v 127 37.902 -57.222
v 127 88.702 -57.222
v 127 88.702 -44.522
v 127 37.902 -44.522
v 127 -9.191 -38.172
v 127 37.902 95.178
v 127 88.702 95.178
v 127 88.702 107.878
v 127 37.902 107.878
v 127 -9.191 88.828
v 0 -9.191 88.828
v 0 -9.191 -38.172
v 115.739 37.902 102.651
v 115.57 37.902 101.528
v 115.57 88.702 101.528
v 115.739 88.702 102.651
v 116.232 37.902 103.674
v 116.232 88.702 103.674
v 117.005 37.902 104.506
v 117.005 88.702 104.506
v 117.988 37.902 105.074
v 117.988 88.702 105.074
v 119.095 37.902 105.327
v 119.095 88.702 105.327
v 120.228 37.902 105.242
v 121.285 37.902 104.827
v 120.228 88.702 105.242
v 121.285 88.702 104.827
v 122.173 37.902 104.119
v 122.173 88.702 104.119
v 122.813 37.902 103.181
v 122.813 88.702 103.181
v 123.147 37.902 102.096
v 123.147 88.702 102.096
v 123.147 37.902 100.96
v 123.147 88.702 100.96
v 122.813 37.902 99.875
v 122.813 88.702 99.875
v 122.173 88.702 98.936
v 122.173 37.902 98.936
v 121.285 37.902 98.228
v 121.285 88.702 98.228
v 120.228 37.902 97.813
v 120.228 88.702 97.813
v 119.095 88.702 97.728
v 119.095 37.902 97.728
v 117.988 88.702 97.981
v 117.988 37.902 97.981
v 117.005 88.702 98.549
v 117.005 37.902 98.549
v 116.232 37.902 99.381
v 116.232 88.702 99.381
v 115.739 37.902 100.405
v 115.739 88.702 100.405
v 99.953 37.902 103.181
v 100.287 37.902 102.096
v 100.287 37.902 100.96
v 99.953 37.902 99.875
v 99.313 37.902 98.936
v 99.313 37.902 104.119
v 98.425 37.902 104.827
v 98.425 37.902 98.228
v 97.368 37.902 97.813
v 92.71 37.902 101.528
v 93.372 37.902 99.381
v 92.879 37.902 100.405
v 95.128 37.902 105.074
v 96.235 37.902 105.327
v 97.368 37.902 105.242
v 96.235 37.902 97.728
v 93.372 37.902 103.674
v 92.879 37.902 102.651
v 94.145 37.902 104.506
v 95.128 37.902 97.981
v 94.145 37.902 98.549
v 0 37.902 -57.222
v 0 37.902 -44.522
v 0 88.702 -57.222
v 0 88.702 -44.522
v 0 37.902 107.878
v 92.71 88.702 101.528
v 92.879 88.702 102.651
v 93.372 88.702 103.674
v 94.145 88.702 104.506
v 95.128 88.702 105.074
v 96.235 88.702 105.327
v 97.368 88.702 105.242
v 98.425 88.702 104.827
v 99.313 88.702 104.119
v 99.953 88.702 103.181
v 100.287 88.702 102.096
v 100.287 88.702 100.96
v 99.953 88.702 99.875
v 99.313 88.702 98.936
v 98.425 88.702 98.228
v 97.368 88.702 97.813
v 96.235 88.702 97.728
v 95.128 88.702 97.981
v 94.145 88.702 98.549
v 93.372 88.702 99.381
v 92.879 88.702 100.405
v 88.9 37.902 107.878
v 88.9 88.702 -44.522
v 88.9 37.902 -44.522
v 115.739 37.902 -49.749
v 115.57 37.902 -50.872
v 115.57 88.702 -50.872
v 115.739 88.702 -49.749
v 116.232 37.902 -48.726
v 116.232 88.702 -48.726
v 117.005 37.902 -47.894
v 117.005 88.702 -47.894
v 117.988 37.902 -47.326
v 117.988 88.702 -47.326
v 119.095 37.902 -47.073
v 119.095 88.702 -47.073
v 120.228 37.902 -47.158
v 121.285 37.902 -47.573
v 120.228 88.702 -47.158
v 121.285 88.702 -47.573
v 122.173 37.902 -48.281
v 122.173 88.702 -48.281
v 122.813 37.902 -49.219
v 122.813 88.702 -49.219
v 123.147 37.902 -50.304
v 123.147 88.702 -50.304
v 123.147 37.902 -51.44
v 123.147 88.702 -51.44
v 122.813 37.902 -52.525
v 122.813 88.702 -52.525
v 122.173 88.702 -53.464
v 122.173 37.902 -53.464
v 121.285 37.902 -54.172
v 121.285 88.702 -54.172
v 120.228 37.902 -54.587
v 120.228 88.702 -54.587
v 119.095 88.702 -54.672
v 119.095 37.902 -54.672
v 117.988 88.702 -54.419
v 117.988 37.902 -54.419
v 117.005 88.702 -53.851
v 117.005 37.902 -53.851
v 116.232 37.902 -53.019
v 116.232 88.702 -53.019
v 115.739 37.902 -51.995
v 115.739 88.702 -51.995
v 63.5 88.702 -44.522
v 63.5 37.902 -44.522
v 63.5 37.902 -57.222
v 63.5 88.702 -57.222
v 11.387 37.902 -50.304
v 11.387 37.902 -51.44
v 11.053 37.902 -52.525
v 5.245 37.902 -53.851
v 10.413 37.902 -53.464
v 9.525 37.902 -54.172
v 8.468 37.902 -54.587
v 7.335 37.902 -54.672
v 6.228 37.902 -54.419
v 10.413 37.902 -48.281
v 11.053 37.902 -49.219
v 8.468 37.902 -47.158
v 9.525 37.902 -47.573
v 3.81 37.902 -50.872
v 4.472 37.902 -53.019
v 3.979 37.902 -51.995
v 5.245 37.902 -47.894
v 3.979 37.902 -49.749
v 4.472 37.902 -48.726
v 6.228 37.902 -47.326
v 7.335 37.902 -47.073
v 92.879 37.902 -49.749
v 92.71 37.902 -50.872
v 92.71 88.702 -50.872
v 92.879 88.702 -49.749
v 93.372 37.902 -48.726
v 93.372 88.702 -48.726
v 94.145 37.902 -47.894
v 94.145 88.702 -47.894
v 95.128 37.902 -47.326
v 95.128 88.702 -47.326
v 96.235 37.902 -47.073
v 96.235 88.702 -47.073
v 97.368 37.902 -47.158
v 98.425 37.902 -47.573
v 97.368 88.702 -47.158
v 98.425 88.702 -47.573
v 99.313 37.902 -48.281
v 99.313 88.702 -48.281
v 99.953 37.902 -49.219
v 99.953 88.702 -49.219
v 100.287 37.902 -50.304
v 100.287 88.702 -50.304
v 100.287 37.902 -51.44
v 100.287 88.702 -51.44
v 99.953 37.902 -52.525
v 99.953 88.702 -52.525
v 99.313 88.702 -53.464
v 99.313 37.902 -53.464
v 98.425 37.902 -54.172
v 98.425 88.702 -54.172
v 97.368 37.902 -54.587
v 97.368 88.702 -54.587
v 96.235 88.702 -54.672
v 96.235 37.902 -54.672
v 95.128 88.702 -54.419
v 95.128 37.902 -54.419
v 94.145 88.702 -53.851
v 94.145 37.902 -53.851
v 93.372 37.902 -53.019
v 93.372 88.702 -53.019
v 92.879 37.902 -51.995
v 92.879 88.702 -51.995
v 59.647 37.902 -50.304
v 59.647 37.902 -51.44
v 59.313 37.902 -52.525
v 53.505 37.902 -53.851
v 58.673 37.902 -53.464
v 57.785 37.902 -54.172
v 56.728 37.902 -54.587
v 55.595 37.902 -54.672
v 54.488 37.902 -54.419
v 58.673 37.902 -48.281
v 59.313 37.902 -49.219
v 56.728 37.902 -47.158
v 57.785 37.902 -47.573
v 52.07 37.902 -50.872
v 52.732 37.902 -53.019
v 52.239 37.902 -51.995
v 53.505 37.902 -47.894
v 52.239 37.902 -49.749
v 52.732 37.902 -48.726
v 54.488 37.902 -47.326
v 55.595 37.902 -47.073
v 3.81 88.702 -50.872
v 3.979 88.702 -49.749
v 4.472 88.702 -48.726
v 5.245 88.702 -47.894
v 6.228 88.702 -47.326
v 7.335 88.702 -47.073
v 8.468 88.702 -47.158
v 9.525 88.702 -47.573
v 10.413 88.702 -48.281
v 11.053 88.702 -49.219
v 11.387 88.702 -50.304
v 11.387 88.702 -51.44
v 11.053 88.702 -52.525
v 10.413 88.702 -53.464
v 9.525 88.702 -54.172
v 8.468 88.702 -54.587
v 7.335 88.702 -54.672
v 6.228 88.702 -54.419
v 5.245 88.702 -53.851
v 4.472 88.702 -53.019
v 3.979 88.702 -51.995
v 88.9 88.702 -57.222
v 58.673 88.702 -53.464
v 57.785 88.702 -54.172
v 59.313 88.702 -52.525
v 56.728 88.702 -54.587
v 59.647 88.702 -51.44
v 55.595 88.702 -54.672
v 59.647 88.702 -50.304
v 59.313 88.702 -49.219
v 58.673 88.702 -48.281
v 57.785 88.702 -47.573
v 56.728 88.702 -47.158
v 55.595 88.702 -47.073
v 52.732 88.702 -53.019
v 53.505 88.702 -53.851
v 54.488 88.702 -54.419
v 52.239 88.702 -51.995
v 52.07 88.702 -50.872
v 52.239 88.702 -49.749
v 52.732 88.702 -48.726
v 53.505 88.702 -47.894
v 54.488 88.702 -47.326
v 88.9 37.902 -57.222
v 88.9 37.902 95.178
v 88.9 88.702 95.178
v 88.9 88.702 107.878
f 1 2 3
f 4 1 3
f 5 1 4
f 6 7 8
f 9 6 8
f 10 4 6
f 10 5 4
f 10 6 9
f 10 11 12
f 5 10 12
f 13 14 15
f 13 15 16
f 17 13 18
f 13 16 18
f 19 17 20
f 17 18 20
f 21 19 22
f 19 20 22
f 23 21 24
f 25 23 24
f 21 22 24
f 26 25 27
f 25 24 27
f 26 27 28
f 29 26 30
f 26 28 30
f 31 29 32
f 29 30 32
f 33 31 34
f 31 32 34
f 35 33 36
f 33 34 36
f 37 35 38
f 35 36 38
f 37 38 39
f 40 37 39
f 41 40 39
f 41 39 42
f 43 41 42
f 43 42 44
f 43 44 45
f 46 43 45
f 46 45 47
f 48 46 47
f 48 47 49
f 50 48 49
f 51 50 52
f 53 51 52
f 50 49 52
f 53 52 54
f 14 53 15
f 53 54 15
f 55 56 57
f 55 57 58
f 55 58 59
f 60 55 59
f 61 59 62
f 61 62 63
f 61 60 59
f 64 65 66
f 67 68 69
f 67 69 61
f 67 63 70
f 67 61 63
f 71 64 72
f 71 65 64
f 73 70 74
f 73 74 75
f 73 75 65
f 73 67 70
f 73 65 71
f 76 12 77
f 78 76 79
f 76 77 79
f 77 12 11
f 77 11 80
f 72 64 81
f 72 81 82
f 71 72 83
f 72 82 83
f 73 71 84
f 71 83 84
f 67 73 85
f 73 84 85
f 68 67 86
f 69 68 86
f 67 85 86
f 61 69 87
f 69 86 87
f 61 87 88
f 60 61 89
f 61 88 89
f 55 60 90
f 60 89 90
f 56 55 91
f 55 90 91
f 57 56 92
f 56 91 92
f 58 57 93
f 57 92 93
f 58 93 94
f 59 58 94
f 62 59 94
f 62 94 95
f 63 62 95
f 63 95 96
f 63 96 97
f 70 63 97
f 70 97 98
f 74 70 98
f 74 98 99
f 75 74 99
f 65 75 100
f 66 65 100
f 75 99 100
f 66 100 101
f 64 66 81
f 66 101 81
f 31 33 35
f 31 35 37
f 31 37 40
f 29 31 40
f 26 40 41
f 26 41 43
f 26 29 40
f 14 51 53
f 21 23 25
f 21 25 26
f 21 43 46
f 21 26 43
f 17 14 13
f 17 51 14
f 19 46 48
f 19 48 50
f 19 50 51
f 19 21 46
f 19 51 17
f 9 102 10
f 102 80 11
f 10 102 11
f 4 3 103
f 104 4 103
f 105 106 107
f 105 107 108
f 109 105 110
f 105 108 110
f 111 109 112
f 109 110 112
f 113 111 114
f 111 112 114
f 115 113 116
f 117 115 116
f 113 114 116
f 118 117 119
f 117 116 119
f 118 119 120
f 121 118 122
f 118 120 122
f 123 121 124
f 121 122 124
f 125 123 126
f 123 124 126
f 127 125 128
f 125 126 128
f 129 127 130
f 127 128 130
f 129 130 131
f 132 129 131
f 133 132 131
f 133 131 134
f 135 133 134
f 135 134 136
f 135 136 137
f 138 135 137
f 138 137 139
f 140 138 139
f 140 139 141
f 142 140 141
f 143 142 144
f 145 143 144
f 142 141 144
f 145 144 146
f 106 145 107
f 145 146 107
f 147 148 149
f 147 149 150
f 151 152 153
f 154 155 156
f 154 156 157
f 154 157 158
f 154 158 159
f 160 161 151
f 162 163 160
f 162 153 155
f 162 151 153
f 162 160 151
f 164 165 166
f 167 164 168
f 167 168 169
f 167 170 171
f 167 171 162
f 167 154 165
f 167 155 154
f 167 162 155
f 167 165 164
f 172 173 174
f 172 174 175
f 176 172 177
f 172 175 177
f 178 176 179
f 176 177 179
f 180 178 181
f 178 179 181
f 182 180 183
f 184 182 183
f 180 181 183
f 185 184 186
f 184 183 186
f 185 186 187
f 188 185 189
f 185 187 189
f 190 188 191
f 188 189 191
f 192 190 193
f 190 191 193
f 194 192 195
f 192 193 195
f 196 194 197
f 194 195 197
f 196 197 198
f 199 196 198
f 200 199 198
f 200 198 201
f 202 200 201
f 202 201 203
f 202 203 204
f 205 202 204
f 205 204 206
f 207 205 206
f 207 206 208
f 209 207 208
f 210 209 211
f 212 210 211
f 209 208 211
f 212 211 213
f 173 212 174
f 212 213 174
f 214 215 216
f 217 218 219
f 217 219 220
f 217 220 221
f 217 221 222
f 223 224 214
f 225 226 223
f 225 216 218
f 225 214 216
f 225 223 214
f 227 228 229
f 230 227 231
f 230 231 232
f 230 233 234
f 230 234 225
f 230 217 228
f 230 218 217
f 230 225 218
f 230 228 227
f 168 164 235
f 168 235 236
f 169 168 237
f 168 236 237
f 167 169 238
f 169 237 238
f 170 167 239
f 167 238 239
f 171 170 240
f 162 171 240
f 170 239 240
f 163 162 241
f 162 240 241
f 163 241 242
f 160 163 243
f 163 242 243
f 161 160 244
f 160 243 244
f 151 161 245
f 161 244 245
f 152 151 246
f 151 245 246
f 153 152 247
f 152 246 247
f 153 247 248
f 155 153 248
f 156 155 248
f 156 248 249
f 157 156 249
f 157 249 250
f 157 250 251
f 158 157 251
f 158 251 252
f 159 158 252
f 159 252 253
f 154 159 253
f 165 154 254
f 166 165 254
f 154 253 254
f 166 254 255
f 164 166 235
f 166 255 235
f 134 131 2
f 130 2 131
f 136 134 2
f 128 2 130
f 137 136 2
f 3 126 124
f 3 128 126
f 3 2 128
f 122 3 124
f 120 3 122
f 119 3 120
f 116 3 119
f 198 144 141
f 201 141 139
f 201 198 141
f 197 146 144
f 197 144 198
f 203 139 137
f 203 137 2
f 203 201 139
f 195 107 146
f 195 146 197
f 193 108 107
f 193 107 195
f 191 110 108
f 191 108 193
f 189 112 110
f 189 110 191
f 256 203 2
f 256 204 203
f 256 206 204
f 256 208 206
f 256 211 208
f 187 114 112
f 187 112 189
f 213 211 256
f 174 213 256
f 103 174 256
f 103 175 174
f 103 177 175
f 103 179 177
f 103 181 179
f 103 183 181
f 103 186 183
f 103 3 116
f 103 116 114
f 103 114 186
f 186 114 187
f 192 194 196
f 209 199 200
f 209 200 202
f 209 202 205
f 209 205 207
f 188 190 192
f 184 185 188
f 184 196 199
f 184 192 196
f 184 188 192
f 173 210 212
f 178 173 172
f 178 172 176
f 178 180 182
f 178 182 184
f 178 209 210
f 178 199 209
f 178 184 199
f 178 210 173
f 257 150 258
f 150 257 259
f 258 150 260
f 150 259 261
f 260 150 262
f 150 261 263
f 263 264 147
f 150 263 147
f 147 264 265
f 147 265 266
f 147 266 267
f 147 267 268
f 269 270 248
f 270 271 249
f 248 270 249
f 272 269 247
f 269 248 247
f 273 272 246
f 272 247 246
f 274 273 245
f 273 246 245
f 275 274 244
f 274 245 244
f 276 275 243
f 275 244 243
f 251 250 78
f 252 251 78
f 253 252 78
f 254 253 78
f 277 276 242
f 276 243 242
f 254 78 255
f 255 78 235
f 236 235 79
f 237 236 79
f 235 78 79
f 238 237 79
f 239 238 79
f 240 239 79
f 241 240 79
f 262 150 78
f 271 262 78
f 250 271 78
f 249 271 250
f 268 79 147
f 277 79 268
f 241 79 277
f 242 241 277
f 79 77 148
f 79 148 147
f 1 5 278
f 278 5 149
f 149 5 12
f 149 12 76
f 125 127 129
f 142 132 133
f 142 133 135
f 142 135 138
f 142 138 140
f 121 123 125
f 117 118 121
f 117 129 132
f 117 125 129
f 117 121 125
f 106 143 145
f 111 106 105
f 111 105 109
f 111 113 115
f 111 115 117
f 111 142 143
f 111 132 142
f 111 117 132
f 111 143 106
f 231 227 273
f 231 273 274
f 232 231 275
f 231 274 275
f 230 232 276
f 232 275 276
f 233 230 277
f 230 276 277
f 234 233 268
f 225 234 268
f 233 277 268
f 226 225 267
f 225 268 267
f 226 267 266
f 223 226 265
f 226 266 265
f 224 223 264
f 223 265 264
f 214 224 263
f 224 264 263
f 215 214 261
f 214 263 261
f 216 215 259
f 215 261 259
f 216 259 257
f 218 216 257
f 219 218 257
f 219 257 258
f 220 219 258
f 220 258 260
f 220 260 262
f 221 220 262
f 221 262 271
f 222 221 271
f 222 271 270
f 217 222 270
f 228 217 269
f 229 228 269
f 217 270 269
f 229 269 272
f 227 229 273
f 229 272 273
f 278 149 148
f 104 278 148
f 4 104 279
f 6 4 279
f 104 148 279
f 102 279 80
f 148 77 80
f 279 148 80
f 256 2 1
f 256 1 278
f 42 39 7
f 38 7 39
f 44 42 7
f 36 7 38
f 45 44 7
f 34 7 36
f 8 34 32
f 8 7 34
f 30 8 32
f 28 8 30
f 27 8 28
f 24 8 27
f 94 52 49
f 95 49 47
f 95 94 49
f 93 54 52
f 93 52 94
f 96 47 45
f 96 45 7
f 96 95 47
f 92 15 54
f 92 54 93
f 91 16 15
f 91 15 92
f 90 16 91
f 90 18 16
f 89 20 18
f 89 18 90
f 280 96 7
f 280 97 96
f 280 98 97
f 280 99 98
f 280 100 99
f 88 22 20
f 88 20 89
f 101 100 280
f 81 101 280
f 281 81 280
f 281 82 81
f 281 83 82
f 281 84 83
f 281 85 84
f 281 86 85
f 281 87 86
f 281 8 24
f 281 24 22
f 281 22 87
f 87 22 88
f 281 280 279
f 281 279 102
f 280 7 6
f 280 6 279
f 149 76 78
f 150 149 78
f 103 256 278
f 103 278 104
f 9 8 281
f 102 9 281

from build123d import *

# Parameters (mm, degrees)
F1_DEPTH  = 127
F0_W      = 50.8
F0_H      = 12.7
F2_DEPTH  = 63.5
F3_W      = 38.1
F3_H      = 12.7
F4_DEPTH  = 50.8
F5_R      = 3.81
F6_DEPTH  = 50.8
F7_R      = 3.81
F8_DEPTH  = 50.8
F9_R      = 3.81
F10_DEPTH = 50.8


with BuildPart() as f1:
    # F0 (on Right) → F1 (new body)
    with BuildSketch(Plane.YZ):
        Polygon((37.902087, -44.522293), (37.902087, 107.877707), (-9.190773, 88.827707), (-9.190773, -38.172293), (37.902087, -57.222293), align=None)
    extrude(amount=F1_DEPTH)

    # F0 (on Right) → F2 (join)
    with BuildSketch(Plane.YZ):
        with Locations((63.302087, -50.872293)):
            Rectangle(F0_W, F0_H)
    extrude(amount=F2_DEPTH)

    # F3 (on face) → F4 (join)
    with BuildSketch(Plane(origin=(0, 37.902087, 0), x_dir=(-1, 0, 0), z_dir=(0, 1, 0))):
        with Locations((-107.95, -50.872293)):
            Rectangle(F3_W, F3_H)
        with Locations((-107.95, 101.527707)):
            Rectangle(F3_W, F3_H)
    extrude(amount=F4_DEPTH)

    # F5 (on face) → F6 (cut)
    with BuildSketch(Plane(origin=(0, 88.702087, 0), x_dir=(-1, 0, 0), z_dir=(0, 1, 0))):
        with Locations((-96.52, 101.527707)):
            Circle(F5_R)
        with Locations((-119.38, 101.527707)):
            Circle(F5_R)
    extrude(amount=-F6_DEPTH, mode=Mode.SUBTRACT)

    # F7 (on face) → F8 (cut)
    with BuildSketch(Plane(origin=(0, 88.702087, 0), x_dir=(-1, 0, 0), z_dir=(0, 1, 0))):
        with Locations((-96.52, -50.872293)):
            Circle(F7_R)
        with Locations((-119.38, -50.872293)):
            Circle(F7_R)
    extrude(amount=-F8_DEPTH, mode=Mode.SUBTRACT)

    # F9 (on face) → F10 (cut)
    with BuildSketch(Plane(origin=(0, 88.702087, 0), x_dir=(-1, 0, 0), z_dir=(0, 1, 0))):
        with Locations((-55.88, -50.872293)):
            Circle(F9_R)
        with Locations((-7.62, -50.872293)):
            Circle(F9_R)
    extrude(amount=-F10_DEPTH, mode=Mode.SUBTRACT)


solid = f1.part
